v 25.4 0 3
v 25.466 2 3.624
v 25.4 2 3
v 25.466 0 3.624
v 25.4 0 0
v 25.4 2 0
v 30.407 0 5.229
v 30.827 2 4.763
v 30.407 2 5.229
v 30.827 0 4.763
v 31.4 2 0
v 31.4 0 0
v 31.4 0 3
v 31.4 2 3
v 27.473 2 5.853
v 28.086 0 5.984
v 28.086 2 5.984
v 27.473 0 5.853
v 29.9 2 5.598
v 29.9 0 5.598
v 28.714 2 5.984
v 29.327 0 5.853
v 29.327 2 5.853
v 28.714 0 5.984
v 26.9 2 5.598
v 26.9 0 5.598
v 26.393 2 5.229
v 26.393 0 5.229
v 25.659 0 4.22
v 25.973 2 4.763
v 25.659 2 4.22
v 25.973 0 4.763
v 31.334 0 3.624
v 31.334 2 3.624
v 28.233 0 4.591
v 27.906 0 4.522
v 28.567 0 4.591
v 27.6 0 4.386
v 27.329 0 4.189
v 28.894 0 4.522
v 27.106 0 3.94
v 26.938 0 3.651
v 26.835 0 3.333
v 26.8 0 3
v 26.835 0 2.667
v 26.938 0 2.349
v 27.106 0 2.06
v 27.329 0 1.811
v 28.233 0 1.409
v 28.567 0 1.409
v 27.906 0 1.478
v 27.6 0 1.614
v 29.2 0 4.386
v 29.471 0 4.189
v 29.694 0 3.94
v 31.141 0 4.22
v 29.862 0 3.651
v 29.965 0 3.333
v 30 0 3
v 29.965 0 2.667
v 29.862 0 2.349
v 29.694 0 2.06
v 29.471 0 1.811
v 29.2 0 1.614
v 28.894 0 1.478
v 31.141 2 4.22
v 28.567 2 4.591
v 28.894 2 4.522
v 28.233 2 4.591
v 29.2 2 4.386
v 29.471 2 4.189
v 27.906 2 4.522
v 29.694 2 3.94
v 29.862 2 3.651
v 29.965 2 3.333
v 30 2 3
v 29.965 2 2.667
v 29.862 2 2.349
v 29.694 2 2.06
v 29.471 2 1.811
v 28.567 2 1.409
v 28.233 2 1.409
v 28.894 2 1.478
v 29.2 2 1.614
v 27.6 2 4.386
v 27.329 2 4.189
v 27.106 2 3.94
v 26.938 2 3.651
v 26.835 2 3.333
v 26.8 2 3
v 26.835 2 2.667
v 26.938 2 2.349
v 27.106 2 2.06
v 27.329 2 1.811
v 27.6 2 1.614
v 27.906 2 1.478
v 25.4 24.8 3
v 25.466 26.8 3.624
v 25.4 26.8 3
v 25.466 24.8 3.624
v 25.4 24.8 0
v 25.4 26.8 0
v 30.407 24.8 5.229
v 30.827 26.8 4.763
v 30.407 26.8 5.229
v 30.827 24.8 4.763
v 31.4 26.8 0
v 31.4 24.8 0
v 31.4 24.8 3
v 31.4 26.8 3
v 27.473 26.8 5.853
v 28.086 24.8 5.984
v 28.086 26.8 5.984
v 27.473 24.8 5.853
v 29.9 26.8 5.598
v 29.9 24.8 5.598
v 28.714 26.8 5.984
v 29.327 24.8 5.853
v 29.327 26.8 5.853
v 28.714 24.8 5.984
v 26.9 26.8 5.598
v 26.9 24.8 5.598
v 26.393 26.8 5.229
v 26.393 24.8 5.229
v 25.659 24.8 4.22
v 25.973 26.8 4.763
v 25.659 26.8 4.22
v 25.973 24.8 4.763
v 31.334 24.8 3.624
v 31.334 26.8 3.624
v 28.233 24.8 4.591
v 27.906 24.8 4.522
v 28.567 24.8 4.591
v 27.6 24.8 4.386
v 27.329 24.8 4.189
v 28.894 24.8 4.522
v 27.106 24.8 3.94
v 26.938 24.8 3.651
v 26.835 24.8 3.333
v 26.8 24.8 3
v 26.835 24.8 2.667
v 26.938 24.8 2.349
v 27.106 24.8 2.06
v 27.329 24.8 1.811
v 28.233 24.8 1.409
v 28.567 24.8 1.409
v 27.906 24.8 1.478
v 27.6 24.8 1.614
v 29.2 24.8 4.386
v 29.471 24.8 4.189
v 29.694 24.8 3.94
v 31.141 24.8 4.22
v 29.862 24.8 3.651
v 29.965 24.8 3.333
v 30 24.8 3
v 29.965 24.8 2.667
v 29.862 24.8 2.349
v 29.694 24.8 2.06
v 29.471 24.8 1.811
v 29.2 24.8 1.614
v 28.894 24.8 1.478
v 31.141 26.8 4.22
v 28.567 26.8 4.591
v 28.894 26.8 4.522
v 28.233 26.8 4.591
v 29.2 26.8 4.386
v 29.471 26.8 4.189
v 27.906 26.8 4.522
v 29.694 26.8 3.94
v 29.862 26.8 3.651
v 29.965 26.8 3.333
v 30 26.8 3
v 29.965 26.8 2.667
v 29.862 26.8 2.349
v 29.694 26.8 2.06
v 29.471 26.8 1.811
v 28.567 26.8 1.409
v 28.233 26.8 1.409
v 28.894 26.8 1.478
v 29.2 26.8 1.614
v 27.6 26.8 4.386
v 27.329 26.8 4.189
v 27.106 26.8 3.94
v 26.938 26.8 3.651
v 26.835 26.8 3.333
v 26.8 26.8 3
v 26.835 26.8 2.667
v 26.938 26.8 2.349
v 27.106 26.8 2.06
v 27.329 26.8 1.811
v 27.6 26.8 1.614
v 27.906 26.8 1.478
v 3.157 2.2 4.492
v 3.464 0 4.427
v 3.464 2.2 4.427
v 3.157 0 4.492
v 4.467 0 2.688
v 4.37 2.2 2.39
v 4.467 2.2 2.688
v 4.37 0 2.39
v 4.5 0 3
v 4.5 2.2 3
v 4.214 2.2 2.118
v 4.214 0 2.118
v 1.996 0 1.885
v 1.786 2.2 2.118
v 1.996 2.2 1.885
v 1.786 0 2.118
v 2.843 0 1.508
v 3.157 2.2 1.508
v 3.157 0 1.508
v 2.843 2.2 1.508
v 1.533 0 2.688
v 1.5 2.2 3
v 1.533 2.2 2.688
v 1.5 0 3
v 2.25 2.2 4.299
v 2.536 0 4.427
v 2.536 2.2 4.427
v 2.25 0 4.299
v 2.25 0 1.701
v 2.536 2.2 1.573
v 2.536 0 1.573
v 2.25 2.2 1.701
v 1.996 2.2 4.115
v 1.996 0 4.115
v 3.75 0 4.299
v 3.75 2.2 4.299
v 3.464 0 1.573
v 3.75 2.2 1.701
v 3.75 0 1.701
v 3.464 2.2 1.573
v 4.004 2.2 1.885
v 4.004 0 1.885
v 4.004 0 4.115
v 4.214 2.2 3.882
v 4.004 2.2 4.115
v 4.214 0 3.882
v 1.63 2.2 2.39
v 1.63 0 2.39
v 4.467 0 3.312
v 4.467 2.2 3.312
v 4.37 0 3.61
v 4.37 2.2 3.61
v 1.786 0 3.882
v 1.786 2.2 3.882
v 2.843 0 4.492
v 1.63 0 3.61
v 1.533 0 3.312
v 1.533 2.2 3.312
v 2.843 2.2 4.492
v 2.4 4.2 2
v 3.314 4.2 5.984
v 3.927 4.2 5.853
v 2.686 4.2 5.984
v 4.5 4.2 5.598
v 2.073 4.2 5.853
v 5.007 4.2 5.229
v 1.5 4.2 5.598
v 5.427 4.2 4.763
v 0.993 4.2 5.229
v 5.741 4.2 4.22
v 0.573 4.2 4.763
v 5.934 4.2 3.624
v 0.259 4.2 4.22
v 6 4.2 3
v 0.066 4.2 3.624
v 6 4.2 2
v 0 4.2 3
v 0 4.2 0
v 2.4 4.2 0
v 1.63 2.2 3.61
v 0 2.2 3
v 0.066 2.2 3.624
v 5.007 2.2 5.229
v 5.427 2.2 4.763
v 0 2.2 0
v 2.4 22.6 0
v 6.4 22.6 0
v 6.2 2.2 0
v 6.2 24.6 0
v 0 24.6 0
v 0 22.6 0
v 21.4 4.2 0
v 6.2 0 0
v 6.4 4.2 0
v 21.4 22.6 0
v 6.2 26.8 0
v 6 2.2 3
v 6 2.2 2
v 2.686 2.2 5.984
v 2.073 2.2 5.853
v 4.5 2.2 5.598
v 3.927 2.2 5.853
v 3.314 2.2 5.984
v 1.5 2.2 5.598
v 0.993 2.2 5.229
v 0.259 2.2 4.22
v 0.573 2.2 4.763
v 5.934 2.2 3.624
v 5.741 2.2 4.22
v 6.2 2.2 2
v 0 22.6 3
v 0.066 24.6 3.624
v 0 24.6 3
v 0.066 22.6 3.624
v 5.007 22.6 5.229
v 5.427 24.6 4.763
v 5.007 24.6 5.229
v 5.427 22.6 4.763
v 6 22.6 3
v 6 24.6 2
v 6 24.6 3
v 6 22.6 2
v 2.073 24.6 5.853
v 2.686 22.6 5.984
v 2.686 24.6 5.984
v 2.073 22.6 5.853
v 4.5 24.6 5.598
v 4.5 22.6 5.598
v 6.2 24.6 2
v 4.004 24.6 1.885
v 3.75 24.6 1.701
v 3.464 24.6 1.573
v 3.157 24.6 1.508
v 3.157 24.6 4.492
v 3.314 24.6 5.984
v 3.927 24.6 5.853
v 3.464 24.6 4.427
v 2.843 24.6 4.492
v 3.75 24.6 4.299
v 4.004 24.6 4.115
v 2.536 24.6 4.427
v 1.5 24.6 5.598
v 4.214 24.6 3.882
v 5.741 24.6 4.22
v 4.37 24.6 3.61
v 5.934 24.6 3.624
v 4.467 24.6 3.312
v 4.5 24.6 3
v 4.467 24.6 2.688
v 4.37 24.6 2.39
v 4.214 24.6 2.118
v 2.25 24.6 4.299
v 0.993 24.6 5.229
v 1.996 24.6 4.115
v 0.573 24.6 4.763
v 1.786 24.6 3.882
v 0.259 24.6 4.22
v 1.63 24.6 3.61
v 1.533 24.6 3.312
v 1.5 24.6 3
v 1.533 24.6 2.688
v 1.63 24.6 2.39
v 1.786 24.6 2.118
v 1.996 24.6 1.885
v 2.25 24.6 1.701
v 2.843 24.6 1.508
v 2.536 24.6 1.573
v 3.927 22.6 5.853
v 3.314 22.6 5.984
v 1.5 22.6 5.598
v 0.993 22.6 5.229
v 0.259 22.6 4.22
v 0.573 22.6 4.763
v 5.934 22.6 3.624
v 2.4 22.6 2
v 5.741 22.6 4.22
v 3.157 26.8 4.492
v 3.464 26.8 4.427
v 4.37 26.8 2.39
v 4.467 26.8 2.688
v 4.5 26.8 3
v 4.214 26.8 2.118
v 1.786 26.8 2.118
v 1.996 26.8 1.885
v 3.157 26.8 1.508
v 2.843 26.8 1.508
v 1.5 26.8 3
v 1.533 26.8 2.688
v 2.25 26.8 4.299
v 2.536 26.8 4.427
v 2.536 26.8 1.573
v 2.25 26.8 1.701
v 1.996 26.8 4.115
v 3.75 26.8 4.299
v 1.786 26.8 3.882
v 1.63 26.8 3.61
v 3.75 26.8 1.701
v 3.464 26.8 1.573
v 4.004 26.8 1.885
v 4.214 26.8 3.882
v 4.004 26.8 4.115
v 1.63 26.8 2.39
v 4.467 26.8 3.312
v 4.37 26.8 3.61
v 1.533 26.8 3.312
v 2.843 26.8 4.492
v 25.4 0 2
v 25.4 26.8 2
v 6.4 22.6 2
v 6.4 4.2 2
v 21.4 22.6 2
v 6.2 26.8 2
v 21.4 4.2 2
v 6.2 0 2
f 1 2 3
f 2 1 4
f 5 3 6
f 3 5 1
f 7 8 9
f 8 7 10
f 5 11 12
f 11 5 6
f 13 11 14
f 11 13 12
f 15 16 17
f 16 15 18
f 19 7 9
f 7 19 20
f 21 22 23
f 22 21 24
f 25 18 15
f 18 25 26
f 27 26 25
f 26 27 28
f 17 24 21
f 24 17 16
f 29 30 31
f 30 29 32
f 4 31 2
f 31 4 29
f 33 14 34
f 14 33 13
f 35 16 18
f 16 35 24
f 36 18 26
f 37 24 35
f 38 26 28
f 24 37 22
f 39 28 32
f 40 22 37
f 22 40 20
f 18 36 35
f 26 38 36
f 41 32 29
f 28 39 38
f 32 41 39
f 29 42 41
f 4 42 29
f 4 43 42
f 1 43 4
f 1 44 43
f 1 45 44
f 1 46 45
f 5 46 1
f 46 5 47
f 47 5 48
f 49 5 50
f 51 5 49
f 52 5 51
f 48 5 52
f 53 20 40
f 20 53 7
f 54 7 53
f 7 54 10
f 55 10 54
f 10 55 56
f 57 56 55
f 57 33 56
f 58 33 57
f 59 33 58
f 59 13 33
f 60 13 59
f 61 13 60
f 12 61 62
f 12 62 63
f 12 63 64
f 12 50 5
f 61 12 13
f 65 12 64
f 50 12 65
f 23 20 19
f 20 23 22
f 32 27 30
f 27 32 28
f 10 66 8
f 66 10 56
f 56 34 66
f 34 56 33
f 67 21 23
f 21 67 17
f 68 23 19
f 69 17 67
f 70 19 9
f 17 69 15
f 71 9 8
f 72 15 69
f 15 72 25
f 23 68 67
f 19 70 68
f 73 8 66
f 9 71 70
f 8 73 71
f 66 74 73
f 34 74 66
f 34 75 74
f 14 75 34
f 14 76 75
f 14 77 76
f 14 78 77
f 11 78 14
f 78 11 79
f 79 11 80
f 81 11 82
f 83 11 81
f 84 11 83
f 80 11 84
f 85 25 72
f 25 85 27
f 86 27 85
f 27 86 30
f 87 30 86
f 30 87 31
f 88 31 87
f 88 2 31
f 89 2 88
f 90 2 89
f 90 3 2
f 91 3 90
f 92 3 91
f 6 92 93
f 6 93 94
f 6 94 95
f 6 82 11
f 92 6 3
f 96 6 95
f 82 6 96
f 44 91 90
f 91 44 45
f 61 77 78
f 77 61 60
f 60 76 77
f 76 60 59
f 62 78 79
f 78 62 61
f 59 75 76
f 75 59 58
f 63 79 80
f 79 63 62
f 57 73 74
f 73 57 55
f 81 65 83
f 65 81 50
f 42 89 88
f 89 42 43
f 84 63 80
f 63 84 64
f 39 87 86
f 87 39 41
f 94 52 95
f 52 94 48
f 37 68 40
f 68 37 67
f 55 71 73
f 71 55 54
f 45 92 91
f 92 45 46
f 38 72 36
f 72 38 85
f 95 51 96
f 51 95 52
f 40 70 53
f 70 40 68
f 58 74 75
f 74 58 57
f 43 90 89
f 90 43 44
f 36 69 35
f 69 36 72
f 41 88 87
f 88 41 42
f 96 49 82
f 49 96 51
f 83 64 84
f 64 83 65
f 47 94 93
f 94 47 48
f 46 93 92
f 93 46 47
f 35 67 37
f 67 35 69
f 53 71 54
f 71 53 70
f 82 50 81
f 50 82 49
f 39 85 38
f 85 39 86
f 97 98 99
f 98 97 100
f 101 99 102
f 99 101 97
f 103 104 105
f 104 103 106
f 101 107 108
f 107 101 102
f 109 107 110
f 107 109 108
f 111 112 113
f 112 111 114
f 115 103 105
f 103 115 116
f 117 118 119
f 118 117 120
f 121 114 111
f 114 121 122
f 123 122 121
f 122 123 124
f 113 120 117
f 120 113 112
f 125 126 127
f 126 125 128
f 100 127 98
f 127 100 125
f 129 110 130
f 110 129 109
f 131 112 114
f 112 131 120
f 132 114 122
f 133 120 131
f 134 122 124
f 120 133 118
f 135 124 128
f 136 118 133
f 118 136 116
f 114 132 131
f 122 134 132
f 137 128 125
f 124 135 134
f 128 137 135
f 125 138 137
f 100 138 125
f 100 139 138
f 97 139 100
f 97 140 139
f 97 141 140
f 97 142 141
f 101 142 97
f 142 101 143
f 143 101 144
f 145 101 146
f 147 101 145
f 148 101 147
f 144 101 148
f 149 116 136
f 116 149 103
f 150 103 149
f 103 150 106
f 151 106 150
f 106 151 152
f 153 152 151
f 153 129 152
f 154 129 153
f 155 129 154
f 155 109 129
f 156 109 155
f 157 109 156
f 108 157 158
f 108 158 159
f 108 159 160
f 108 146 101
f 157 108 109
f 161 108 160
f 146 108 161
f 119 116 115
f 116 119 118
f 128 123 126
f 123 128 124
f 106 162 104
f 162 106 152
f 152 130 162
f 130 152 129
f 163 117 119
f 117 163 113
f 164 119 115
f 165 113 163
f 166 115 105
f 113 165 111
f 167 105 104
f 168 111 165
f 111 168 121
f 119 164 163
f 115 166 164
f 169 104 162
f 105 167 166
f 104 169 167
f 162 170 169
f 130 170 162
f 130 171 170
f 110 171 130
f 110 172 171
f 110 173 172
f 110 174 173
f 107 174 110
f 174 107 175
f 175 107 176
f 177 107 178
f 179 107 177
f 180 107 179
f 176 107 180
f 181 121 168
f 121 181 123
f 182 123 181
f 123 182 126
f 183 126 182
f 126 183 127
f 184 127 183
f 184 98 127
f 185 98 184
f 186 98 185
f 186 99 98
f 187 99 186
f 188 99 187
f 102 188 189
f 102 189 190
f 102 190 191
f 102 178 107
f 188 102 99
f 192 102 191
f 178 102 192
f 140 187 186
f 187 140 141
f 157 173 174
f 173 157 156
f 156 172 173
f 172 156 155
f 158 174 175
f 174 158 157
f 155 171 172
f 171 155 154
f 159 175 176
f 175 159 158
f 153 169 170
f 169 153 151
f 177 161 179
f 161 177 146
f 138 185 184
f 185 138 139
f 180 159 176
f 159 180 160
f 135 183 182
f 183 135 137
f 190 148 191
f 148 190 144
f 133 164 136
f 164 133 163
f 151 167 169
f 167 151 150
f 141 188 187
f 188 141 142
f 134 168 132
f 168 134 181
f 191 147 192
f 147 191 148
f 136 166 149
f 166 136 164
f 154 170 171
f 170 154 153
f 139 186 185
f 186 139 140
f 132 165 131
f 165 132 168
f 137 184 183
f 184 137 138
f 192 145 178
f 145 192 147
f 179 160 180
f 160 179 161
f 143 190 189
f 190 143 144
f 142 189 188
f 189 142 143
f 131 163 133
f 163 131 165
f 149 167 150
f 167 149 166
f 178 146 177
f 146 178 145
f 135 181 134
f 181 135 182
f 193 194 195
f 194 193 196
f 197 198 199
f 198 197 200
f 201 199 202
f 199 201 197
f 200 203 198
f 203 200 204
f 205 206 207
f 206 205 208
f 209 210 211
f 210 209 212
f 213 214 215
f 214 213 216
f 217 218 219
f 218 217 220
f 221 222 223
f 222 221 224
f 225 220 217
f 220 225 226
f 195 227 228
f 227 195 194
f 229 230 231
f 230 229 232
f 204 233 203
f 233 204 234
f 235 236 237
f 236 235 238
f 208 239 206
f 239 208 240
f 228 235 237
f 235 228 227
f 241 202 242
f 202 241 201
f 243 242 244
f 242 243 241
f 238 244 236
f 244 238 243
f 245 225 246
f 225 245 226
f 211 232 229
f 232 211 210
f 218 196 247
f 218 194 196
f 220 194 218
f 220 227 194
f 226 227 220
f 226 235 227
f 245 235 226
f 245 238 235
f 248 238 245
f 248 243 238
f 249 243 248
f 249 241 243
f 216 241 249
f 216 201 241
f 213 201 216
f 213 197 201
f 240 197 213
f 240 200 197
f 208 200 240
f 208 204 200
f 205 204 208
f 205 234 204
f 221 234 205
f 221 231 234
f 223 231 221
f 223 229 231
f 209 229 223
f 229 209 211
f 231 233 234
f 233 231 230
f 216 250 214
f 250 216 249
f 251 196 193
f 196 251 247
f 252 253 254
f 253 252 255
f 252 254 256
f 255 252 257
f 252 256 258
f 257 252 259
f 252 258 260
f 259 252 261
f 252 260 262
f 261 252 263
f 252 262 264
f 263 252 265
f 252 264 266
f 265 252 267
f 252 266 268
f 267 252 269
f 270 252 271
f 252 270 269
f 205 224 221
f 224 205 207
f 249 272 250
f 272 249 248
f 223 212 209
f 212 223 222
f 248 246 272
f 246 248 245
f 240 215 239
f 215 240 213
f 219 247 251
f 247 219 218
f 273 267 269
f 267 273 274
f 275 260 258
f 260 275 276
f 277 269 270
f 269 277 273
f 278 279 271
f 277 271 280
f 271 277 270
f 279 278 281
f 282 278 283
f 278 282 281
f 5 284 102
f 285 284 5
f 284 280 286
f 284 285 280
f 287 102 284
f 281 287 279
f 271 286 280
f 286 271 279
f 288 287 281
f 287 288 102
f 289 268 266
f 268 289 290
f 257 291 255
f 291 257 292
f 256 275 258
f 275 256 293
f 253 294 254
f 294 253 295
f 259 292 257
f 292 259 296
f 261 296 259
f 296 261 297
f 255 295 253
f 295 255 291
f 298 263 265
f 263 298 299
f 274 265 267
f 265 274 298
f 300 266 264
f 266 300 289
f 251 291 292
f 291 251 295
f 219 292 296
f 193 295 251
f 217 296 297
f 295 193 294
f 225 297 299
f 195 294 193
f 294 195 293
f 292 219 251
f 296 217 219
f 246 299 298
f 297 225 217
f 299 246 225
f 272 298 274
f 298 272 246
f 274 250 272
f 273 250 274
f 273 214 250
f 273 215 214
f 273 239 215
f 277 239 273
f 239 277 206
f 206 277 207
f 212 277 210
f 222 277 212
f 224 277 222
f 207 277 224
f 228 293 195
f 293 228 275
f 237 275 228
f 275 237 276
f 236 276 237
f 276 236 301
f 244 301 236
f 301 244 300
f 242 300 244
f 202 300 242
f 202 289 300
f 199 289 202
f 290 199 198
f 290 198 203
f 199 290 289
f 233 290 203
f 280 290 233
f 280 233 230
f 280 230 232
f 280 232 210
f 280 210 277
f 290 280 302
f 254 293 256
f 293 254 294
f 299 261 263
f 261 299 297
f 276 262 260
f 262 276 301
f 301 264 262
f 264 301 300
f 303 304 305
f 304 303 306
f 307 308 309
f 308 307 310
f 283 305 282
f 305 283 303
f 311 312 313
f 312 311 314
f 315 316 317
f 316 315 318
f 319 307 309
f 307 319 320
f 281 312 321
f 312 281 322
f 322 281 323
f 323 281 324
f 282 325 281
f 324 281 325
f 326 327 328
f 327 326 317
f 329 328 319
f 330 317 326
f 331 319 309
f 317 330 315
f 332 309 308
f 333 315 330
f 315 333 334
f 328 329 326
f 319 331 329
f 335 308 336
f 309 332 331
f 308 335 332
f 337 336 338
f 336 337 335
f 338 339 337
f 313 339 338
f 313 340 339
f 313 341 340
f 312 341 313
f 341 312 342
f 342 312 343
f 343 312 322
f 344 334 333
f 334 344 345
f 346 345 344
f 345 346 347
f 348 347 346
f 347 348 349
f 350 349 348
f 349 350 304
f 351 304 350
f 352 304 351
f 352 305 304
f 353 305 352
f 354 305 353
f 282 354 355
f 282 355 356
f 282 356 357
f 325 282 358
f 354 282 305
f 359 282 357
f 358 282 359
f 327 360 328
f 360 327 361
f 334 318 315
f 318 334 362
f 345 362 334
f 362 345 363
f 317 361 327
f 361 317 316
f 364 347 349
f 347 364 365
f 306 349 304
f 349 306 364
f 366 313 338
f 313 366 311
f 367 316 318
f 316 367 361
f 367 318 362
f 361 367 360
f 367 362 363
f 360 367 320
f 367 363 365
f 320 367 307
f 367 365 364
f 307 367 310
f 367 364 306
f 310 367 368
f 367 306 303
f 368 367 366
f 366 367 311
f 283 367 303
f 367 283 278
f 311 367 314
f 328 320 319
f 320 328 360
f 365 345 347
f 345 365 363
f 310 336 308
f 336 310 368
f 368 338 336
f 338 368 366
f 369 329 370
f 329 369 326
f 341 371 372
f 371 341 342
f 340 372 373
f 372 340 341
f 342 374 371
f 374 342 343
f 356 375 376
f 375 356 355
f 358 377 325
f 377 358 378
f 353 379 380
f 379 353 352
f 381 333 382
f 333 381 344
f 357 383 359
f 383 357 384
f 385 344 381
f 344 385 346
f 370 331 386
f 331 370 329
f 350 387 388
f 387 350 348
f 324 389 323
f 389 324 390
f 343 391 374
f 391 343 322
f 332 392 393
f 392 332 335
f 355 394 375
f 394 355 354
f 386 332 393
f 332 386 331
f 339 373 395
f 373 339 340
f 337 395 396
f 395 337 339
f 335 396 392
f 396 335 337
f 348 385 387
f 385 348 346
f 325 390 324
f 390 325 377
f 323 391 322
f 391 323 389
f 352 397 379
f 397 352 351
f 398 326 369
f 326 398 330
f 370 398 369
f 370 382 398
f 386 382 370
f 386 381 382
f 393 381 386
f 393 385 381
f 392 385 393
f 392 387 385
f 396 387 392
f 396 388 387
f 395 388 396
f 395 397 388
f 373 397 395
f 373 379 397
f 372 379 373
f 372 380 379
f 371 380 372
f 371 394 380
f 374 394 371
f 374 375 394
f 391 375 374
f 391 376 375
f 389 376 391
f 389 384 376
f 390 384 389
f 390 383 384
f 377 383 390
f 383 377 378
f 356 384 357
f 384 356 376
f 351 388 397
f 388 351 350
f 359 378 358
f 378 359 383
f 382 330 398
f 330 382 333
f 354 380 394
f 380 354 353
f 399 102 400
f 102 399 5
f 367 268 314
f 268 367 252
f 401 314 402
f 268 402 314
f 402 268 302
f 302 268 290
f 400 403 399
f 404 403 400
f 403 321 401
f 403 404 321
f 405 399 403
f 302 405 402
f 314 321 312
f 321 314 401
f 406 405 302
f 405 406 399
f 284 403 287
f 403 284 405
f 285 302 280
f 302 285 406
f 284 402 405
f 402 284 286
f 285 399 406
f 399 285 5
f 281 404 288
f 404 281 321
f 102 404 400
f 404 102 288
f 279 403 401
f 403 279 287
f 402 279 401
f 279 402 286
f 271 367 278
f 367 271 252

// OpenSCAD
intern_width=18;
intern_height=2;
tunnel_width=2;
tunnel_len=25.4;
gap=0.2;

module link() {
	translate([3/2+(5+intern_height)/2-tunnel_width,0,3/2+(5+intern_height)/2-tunnel_width]) rotate([270,0,0])
		cylinder(d=3,h=gap+tunnel_width*2, $fs=0.1);
	translate([3/2+(5+intern_height)/2-tunnel_width,gap+tunnel_width,3/2+(5+intern_height)/2-tunnel_width]) rotate([270,0,0]) hull() {
		cylinder(d=5+intern_height/2,h=tunnel_width, $fs=0.1);
		translate([-2.5-intern_height/4,0,0]) cube([5+intern_height/2,2.5+intern_height/4,tunnel_width]);
	}
	translate([3/2+(5+intern_height)/2-tunnel_width,intern_width+(gap+tunnel_width)*2+gap,3/2+(5+intern_height)/2-tunnel_width]) rotate([270,0,0]) hull() {
		cylinder(d=5+intern_height/2,h=tunnel_width, $fs=0.1);
		translate([-2.5-intern_height/4,0,0]) cube([5+intern_height/2,2.5+intern_height/4,tunnel_width]);
	}
	translate([3/2+(5+intern_height)/2-tunnel_width,intern_width+(gap+tunnel_width)*2+gap,3/2+(5+intern_height)/2-tunnel_width]) rotate([270,0,0])
		cylinder(d=3,h=gap+tunnel_width*2, $fs=0.1);
	translate([tunnel_len-4,gap+tunnel_width,0])
		cube([4,intern_width+(gap+tunnel_width)*2,tunnel_width]);
	translate([5+intern_height/2+gap,0,0])
		cube([tunnel_len-5-intern_height/2-gap,tunnel_width*2+gap,tunnel_width]);
	translate([5+intern_height/2+gap,intern_width+(gap+tunnel_width)*3-tunnel_width,0])
		cube([tunnel_len-5-intern_height/2-gap,tunnel_width*2+gap,tunnel_width]);
	translate([tunnel_width+gap*2,gap+tunnel_width,0])
		cube([4,intern_width+(gap+tunnel_width)*2,tunnel_width]);
	translate([tunnel_len+3/2+(5+intern_height)/2-tunnel_width,0,3/2+(5+intern_height)/2-tunnel_width]) rotate([270,0,0]) difference() {
		hull() {
			cylinder(d=5+intern_height/2,h=tunnel_width, $fs=0.1);
			translate([-2.5-intern_height/4,0,0]) cube([5+intern_height/2,2.5+intern_height/4,tunnel_width]);
		}
		cylinder(d=3+gap,h=tunnel_width, $fs=0.1);
	}
	translate([tunnel_len+3/2+(5+intern_height)/2-tunnel_width,intern_width+(gap+tunnel_width)*3+gap,3/2+(5+intern_height)/2-tunnel_width]) rotate([270,0,0]) difference() {
		hull() {
			cylinder(d=5+intern_height/2,h=tunnel_width, $fs=0.1);
			translate([-2.5-intern_height/4,0,0]) cube([5+intern_height/2,2.5+intern_height/4,tunnel_width]);
		}
		cylinder(d=3+gap,h=tunnel_width, $fs=0.1);
	}
}

link();
//translate([tunnel_len,intern_width+(gap+tunnel_width)*4,tunnel_width*2+intern_height]) rotate([180,0,0]) link();
//translate([2*tunnel_len,0,0]) link();
